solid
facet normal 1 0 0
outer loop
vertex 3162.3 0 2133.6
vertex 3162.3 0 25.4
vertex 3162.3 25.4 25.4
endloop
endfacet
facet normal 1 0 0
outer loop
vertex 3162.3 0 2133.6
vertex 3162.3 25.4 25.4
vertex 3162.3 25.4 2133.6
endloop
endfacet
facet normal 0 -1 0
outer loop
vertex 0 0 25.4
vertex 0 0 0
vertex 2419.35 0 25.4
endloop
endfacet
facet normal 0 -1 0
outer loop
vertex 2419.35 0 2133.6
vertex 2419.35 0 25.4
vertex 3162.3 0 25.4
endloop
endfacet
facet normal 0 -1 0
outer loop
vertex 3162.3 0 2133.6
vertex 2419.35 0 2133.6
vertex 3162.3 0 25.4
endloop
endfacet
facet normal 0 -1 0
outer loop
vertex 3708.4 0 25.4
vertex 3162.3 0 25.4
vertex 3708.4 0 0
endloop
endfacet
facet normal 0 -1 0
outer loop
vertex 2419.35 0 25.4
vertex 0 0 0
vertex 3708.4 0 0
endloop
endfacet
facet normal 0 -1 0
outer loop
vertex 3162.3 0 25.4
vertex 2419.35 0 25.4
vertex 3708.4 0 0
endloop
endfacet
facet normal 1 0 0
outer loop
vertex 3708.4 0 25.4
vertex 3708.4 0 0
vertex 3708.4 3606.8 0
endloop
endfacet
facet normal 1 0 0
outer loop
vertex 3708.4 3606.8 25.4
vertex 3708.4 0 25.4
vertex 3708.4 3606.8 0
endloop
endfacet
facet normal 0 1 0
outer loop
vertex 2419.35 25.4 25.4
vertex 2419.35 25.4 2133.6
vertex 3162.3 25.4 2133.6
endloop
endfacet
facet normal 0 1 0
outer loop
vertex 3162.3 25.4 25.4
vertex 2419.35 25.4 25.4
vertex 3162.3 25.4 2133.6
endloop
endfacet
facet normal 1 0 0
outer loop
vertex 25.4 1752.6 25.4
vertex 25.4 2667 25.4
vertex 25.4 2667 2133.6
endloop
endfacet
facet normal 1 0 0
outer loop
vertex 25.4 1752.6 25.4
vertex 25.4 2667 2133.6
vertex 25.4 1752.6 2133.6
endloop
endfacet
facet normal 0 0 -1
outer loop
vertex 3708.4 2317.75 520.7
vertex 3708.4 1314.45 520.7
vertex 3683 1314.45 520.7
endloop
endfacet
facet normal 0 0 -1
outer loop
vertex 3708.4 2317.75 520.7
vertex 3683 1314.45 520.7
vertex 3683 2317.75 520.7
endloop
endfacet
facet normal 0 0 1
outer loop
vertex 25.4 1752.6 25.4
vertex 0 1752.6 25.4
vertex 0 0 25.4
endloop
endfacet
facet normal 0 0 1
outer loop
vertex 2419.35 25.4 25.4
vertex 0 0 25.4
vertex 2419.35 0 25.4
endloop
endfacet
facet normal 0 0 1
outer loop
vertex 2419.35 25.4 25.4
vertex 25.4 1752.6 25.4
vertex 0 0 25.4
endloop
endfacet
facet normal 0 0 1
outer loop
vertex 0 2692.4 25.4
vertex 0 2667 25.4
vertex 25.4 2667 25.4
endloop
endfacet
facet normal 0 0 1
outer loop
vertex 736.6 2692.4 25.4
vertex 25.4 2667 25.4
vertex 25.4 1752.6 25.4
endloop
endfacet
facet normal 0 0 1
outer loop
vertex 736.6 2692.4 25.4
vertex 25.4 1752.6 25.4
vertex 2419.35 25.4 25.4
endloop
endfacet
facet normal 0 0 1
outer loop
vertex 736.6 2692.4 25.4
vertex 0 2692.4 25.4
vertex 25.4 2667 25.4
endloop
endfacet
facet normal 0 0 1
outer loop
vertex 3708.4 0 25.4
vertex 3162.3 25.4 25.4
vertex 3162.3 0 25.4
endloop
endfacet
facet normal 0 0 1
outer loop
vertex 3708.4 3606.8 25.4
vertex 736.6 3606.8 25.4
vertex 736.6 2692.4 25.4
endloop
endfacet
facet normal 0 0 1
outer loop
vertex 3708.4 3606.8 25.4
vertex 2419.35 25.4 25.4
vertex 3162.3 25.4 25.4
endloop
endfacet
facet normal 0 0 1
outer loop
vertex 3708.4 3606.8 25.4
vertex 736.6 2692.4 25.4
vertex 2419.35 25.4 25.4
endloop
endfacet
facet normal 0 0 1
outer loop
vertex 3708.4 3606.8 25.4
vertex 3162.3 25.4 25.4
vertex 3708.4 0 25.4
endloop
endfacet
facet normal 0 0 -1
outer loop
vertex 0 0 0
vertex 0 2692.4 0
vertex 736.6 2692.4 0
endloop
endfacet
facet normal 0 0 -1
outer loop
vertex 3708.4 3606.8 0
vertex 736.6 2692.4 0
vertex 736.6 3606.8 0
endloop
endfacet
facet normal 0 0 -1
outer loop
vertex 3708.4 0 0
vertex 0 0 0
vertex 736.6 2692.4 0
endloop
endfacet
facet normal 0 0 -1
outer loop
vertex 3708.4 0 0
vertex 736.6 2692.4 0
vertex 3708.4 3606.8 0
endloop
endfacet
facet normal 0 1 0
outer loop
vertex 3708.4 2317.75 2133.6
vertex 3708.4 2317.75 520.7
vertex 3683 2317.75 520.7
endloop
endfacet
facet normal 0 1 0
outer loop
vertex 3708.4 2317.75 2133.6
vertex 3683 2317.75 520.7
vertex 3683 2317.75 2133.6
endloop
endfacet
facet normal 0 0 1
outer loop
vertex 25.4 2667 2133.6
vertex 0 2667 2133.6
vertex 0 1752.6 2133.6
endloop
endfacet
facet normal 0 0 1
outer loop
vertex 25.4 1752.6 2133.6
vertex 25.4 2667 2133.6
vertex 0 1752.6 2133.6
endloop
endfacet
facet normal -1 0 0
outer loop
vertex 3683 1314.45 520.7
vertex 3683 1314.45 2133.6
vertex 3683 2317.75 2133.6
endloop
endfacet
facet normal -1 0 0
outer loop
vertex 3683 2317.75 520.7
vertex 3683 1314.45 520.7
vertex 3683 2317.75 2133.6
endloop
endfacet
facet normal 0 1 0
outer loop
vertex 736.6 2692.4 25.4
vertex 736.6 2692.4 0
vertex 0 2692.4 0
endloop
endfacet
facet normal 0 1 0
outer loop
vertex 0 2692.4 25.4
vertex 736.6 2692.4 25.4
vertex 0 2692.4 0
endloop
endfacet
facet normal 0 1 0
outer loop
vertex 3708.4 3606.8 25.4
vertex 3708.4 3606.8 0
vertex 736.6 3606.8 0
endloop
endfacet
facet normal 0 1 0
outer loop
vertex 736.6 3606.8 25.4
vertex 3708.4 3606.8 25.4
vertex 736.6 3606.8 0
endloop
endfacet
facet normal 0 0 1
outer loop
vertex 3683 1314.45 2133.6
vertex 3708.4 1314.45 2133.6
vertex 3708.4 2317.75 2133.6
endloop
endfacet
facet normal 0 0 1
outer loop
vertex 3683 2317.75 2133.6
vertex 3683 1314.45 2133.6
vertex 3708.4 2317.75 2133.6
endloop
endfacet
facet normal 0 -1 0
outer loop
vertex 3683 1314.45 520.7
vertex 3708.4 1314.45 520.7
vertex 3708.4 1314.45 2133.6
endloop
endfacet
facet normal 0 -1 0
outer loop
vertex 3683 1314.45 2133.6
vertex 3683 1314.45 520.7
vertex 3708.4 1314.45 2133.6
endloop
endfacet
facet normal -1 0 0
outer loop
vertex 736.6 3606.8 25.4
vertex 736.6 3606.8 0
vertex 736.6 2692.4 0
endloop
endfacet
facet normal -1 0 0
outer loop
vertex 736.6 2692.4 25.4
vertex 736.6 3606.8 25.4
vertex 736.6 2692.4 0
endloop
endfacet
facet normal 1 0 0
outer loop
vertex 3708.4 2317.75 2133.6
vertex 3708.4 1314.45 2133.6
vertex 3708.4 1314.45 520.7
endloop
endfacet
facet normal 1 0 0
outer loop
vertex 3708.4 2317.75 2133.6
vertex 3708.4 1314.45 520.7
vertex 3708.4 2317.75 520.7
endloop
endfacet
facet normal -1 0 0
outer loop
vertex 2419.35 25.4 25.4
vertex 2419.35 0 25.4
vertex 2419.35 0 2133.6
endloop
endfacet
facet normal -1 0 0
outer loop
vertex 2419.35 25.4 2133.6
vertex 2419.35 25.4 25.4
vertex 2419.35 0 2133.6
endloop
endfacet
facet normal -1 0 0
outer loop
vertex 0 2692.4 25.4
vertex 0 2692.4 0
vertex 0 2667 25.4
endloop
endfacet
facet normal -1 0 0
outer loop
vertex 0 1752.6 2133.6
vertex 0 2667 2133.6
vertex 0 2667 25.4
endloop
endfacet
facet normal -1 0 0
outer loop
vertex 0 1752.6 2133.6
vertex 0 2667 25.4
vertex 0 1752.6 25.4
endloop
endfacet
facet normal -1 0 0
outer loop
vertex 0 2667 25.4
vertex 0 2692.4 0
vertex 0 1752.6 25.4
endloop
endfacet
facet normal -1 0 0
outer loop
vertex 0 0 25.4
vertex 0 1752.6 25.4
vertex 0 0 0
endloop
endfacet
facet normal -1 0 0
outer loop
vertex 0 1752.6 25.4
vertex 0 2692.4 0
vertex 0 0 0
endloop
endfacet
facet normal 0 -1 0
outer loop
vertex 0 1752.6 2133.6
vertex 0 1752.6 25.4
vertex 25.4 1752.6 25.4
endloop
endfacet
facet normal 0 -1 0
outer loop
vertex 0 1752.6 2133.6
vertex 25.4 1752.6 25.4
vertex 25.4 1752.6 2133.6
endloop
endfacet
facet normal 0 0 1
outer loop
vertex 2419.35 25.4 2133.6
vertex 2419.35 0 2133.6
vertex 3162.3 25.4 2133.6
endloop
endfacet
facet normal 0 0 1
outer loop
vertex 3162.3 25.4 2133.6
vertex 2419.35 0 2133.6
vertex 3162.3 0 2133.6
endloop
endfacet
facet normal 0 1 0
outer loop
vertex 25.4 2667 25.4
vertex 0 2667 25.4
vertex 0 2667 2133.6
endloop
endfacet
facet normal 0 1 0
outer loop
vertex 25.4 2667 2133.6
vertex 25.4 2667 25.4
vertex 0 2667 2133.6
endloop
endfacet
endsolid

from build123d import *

# Parameters (mm, degrees)
F2_DEPTH = 25.4
F3_W     = 914.4
F3_H     = 2133.6
F4_DEPTH = 25.4
F5_W     = 742.95
F5_H     = 2133.6
F6_DEPTH = 25.4
F7_W     = 1003.3
F7_H     = 1612.9
F8_DEPTH = 25.4


with BuildPart() as f2:
    # F0 (on Top) → F2 (new body)
    with BuildSketch(Plane.XY):
        Polygon((0, 2692.4), (0, 0), (3708.4, 0), (3708.4, 3606.8), (736.6, 3606.8), (736.6, 2692.4), align=None)
    extrude(amount=F2_DEPTH)

    # F3 (on face) → F4 (join)
    with BuildSketch(Plane(origin=(0, 0, 0), x_dir=(0, -1, 0), z_dir=(-1, 0, 0))):
        with Locations((-2209.8, 1066.8)):
            Rectangle(F3_W, F3_H)
    extrude(amount=-F4_DEPTH)

    # F5 (on face) → F6 (join)
    with BuildSketch(Plane.XZ):
        with Locations((2790.825, 1066.8)):
            Rectangle(F5_W, F5_H)
    extrude(amount=-F6_DEPTH)


with BuildPart() as f8:
    # F7 (on face) → F8 (new body)
    with BuildSketch(Plane.YZ.offset(3708.4)):
        with Locations((1816.1, 1327.15)):
            Rectangle(F7_W, F7_H)
    extrude(amount=-F8_DEPTH)


solid = Compound([f2.part, f8.part])
